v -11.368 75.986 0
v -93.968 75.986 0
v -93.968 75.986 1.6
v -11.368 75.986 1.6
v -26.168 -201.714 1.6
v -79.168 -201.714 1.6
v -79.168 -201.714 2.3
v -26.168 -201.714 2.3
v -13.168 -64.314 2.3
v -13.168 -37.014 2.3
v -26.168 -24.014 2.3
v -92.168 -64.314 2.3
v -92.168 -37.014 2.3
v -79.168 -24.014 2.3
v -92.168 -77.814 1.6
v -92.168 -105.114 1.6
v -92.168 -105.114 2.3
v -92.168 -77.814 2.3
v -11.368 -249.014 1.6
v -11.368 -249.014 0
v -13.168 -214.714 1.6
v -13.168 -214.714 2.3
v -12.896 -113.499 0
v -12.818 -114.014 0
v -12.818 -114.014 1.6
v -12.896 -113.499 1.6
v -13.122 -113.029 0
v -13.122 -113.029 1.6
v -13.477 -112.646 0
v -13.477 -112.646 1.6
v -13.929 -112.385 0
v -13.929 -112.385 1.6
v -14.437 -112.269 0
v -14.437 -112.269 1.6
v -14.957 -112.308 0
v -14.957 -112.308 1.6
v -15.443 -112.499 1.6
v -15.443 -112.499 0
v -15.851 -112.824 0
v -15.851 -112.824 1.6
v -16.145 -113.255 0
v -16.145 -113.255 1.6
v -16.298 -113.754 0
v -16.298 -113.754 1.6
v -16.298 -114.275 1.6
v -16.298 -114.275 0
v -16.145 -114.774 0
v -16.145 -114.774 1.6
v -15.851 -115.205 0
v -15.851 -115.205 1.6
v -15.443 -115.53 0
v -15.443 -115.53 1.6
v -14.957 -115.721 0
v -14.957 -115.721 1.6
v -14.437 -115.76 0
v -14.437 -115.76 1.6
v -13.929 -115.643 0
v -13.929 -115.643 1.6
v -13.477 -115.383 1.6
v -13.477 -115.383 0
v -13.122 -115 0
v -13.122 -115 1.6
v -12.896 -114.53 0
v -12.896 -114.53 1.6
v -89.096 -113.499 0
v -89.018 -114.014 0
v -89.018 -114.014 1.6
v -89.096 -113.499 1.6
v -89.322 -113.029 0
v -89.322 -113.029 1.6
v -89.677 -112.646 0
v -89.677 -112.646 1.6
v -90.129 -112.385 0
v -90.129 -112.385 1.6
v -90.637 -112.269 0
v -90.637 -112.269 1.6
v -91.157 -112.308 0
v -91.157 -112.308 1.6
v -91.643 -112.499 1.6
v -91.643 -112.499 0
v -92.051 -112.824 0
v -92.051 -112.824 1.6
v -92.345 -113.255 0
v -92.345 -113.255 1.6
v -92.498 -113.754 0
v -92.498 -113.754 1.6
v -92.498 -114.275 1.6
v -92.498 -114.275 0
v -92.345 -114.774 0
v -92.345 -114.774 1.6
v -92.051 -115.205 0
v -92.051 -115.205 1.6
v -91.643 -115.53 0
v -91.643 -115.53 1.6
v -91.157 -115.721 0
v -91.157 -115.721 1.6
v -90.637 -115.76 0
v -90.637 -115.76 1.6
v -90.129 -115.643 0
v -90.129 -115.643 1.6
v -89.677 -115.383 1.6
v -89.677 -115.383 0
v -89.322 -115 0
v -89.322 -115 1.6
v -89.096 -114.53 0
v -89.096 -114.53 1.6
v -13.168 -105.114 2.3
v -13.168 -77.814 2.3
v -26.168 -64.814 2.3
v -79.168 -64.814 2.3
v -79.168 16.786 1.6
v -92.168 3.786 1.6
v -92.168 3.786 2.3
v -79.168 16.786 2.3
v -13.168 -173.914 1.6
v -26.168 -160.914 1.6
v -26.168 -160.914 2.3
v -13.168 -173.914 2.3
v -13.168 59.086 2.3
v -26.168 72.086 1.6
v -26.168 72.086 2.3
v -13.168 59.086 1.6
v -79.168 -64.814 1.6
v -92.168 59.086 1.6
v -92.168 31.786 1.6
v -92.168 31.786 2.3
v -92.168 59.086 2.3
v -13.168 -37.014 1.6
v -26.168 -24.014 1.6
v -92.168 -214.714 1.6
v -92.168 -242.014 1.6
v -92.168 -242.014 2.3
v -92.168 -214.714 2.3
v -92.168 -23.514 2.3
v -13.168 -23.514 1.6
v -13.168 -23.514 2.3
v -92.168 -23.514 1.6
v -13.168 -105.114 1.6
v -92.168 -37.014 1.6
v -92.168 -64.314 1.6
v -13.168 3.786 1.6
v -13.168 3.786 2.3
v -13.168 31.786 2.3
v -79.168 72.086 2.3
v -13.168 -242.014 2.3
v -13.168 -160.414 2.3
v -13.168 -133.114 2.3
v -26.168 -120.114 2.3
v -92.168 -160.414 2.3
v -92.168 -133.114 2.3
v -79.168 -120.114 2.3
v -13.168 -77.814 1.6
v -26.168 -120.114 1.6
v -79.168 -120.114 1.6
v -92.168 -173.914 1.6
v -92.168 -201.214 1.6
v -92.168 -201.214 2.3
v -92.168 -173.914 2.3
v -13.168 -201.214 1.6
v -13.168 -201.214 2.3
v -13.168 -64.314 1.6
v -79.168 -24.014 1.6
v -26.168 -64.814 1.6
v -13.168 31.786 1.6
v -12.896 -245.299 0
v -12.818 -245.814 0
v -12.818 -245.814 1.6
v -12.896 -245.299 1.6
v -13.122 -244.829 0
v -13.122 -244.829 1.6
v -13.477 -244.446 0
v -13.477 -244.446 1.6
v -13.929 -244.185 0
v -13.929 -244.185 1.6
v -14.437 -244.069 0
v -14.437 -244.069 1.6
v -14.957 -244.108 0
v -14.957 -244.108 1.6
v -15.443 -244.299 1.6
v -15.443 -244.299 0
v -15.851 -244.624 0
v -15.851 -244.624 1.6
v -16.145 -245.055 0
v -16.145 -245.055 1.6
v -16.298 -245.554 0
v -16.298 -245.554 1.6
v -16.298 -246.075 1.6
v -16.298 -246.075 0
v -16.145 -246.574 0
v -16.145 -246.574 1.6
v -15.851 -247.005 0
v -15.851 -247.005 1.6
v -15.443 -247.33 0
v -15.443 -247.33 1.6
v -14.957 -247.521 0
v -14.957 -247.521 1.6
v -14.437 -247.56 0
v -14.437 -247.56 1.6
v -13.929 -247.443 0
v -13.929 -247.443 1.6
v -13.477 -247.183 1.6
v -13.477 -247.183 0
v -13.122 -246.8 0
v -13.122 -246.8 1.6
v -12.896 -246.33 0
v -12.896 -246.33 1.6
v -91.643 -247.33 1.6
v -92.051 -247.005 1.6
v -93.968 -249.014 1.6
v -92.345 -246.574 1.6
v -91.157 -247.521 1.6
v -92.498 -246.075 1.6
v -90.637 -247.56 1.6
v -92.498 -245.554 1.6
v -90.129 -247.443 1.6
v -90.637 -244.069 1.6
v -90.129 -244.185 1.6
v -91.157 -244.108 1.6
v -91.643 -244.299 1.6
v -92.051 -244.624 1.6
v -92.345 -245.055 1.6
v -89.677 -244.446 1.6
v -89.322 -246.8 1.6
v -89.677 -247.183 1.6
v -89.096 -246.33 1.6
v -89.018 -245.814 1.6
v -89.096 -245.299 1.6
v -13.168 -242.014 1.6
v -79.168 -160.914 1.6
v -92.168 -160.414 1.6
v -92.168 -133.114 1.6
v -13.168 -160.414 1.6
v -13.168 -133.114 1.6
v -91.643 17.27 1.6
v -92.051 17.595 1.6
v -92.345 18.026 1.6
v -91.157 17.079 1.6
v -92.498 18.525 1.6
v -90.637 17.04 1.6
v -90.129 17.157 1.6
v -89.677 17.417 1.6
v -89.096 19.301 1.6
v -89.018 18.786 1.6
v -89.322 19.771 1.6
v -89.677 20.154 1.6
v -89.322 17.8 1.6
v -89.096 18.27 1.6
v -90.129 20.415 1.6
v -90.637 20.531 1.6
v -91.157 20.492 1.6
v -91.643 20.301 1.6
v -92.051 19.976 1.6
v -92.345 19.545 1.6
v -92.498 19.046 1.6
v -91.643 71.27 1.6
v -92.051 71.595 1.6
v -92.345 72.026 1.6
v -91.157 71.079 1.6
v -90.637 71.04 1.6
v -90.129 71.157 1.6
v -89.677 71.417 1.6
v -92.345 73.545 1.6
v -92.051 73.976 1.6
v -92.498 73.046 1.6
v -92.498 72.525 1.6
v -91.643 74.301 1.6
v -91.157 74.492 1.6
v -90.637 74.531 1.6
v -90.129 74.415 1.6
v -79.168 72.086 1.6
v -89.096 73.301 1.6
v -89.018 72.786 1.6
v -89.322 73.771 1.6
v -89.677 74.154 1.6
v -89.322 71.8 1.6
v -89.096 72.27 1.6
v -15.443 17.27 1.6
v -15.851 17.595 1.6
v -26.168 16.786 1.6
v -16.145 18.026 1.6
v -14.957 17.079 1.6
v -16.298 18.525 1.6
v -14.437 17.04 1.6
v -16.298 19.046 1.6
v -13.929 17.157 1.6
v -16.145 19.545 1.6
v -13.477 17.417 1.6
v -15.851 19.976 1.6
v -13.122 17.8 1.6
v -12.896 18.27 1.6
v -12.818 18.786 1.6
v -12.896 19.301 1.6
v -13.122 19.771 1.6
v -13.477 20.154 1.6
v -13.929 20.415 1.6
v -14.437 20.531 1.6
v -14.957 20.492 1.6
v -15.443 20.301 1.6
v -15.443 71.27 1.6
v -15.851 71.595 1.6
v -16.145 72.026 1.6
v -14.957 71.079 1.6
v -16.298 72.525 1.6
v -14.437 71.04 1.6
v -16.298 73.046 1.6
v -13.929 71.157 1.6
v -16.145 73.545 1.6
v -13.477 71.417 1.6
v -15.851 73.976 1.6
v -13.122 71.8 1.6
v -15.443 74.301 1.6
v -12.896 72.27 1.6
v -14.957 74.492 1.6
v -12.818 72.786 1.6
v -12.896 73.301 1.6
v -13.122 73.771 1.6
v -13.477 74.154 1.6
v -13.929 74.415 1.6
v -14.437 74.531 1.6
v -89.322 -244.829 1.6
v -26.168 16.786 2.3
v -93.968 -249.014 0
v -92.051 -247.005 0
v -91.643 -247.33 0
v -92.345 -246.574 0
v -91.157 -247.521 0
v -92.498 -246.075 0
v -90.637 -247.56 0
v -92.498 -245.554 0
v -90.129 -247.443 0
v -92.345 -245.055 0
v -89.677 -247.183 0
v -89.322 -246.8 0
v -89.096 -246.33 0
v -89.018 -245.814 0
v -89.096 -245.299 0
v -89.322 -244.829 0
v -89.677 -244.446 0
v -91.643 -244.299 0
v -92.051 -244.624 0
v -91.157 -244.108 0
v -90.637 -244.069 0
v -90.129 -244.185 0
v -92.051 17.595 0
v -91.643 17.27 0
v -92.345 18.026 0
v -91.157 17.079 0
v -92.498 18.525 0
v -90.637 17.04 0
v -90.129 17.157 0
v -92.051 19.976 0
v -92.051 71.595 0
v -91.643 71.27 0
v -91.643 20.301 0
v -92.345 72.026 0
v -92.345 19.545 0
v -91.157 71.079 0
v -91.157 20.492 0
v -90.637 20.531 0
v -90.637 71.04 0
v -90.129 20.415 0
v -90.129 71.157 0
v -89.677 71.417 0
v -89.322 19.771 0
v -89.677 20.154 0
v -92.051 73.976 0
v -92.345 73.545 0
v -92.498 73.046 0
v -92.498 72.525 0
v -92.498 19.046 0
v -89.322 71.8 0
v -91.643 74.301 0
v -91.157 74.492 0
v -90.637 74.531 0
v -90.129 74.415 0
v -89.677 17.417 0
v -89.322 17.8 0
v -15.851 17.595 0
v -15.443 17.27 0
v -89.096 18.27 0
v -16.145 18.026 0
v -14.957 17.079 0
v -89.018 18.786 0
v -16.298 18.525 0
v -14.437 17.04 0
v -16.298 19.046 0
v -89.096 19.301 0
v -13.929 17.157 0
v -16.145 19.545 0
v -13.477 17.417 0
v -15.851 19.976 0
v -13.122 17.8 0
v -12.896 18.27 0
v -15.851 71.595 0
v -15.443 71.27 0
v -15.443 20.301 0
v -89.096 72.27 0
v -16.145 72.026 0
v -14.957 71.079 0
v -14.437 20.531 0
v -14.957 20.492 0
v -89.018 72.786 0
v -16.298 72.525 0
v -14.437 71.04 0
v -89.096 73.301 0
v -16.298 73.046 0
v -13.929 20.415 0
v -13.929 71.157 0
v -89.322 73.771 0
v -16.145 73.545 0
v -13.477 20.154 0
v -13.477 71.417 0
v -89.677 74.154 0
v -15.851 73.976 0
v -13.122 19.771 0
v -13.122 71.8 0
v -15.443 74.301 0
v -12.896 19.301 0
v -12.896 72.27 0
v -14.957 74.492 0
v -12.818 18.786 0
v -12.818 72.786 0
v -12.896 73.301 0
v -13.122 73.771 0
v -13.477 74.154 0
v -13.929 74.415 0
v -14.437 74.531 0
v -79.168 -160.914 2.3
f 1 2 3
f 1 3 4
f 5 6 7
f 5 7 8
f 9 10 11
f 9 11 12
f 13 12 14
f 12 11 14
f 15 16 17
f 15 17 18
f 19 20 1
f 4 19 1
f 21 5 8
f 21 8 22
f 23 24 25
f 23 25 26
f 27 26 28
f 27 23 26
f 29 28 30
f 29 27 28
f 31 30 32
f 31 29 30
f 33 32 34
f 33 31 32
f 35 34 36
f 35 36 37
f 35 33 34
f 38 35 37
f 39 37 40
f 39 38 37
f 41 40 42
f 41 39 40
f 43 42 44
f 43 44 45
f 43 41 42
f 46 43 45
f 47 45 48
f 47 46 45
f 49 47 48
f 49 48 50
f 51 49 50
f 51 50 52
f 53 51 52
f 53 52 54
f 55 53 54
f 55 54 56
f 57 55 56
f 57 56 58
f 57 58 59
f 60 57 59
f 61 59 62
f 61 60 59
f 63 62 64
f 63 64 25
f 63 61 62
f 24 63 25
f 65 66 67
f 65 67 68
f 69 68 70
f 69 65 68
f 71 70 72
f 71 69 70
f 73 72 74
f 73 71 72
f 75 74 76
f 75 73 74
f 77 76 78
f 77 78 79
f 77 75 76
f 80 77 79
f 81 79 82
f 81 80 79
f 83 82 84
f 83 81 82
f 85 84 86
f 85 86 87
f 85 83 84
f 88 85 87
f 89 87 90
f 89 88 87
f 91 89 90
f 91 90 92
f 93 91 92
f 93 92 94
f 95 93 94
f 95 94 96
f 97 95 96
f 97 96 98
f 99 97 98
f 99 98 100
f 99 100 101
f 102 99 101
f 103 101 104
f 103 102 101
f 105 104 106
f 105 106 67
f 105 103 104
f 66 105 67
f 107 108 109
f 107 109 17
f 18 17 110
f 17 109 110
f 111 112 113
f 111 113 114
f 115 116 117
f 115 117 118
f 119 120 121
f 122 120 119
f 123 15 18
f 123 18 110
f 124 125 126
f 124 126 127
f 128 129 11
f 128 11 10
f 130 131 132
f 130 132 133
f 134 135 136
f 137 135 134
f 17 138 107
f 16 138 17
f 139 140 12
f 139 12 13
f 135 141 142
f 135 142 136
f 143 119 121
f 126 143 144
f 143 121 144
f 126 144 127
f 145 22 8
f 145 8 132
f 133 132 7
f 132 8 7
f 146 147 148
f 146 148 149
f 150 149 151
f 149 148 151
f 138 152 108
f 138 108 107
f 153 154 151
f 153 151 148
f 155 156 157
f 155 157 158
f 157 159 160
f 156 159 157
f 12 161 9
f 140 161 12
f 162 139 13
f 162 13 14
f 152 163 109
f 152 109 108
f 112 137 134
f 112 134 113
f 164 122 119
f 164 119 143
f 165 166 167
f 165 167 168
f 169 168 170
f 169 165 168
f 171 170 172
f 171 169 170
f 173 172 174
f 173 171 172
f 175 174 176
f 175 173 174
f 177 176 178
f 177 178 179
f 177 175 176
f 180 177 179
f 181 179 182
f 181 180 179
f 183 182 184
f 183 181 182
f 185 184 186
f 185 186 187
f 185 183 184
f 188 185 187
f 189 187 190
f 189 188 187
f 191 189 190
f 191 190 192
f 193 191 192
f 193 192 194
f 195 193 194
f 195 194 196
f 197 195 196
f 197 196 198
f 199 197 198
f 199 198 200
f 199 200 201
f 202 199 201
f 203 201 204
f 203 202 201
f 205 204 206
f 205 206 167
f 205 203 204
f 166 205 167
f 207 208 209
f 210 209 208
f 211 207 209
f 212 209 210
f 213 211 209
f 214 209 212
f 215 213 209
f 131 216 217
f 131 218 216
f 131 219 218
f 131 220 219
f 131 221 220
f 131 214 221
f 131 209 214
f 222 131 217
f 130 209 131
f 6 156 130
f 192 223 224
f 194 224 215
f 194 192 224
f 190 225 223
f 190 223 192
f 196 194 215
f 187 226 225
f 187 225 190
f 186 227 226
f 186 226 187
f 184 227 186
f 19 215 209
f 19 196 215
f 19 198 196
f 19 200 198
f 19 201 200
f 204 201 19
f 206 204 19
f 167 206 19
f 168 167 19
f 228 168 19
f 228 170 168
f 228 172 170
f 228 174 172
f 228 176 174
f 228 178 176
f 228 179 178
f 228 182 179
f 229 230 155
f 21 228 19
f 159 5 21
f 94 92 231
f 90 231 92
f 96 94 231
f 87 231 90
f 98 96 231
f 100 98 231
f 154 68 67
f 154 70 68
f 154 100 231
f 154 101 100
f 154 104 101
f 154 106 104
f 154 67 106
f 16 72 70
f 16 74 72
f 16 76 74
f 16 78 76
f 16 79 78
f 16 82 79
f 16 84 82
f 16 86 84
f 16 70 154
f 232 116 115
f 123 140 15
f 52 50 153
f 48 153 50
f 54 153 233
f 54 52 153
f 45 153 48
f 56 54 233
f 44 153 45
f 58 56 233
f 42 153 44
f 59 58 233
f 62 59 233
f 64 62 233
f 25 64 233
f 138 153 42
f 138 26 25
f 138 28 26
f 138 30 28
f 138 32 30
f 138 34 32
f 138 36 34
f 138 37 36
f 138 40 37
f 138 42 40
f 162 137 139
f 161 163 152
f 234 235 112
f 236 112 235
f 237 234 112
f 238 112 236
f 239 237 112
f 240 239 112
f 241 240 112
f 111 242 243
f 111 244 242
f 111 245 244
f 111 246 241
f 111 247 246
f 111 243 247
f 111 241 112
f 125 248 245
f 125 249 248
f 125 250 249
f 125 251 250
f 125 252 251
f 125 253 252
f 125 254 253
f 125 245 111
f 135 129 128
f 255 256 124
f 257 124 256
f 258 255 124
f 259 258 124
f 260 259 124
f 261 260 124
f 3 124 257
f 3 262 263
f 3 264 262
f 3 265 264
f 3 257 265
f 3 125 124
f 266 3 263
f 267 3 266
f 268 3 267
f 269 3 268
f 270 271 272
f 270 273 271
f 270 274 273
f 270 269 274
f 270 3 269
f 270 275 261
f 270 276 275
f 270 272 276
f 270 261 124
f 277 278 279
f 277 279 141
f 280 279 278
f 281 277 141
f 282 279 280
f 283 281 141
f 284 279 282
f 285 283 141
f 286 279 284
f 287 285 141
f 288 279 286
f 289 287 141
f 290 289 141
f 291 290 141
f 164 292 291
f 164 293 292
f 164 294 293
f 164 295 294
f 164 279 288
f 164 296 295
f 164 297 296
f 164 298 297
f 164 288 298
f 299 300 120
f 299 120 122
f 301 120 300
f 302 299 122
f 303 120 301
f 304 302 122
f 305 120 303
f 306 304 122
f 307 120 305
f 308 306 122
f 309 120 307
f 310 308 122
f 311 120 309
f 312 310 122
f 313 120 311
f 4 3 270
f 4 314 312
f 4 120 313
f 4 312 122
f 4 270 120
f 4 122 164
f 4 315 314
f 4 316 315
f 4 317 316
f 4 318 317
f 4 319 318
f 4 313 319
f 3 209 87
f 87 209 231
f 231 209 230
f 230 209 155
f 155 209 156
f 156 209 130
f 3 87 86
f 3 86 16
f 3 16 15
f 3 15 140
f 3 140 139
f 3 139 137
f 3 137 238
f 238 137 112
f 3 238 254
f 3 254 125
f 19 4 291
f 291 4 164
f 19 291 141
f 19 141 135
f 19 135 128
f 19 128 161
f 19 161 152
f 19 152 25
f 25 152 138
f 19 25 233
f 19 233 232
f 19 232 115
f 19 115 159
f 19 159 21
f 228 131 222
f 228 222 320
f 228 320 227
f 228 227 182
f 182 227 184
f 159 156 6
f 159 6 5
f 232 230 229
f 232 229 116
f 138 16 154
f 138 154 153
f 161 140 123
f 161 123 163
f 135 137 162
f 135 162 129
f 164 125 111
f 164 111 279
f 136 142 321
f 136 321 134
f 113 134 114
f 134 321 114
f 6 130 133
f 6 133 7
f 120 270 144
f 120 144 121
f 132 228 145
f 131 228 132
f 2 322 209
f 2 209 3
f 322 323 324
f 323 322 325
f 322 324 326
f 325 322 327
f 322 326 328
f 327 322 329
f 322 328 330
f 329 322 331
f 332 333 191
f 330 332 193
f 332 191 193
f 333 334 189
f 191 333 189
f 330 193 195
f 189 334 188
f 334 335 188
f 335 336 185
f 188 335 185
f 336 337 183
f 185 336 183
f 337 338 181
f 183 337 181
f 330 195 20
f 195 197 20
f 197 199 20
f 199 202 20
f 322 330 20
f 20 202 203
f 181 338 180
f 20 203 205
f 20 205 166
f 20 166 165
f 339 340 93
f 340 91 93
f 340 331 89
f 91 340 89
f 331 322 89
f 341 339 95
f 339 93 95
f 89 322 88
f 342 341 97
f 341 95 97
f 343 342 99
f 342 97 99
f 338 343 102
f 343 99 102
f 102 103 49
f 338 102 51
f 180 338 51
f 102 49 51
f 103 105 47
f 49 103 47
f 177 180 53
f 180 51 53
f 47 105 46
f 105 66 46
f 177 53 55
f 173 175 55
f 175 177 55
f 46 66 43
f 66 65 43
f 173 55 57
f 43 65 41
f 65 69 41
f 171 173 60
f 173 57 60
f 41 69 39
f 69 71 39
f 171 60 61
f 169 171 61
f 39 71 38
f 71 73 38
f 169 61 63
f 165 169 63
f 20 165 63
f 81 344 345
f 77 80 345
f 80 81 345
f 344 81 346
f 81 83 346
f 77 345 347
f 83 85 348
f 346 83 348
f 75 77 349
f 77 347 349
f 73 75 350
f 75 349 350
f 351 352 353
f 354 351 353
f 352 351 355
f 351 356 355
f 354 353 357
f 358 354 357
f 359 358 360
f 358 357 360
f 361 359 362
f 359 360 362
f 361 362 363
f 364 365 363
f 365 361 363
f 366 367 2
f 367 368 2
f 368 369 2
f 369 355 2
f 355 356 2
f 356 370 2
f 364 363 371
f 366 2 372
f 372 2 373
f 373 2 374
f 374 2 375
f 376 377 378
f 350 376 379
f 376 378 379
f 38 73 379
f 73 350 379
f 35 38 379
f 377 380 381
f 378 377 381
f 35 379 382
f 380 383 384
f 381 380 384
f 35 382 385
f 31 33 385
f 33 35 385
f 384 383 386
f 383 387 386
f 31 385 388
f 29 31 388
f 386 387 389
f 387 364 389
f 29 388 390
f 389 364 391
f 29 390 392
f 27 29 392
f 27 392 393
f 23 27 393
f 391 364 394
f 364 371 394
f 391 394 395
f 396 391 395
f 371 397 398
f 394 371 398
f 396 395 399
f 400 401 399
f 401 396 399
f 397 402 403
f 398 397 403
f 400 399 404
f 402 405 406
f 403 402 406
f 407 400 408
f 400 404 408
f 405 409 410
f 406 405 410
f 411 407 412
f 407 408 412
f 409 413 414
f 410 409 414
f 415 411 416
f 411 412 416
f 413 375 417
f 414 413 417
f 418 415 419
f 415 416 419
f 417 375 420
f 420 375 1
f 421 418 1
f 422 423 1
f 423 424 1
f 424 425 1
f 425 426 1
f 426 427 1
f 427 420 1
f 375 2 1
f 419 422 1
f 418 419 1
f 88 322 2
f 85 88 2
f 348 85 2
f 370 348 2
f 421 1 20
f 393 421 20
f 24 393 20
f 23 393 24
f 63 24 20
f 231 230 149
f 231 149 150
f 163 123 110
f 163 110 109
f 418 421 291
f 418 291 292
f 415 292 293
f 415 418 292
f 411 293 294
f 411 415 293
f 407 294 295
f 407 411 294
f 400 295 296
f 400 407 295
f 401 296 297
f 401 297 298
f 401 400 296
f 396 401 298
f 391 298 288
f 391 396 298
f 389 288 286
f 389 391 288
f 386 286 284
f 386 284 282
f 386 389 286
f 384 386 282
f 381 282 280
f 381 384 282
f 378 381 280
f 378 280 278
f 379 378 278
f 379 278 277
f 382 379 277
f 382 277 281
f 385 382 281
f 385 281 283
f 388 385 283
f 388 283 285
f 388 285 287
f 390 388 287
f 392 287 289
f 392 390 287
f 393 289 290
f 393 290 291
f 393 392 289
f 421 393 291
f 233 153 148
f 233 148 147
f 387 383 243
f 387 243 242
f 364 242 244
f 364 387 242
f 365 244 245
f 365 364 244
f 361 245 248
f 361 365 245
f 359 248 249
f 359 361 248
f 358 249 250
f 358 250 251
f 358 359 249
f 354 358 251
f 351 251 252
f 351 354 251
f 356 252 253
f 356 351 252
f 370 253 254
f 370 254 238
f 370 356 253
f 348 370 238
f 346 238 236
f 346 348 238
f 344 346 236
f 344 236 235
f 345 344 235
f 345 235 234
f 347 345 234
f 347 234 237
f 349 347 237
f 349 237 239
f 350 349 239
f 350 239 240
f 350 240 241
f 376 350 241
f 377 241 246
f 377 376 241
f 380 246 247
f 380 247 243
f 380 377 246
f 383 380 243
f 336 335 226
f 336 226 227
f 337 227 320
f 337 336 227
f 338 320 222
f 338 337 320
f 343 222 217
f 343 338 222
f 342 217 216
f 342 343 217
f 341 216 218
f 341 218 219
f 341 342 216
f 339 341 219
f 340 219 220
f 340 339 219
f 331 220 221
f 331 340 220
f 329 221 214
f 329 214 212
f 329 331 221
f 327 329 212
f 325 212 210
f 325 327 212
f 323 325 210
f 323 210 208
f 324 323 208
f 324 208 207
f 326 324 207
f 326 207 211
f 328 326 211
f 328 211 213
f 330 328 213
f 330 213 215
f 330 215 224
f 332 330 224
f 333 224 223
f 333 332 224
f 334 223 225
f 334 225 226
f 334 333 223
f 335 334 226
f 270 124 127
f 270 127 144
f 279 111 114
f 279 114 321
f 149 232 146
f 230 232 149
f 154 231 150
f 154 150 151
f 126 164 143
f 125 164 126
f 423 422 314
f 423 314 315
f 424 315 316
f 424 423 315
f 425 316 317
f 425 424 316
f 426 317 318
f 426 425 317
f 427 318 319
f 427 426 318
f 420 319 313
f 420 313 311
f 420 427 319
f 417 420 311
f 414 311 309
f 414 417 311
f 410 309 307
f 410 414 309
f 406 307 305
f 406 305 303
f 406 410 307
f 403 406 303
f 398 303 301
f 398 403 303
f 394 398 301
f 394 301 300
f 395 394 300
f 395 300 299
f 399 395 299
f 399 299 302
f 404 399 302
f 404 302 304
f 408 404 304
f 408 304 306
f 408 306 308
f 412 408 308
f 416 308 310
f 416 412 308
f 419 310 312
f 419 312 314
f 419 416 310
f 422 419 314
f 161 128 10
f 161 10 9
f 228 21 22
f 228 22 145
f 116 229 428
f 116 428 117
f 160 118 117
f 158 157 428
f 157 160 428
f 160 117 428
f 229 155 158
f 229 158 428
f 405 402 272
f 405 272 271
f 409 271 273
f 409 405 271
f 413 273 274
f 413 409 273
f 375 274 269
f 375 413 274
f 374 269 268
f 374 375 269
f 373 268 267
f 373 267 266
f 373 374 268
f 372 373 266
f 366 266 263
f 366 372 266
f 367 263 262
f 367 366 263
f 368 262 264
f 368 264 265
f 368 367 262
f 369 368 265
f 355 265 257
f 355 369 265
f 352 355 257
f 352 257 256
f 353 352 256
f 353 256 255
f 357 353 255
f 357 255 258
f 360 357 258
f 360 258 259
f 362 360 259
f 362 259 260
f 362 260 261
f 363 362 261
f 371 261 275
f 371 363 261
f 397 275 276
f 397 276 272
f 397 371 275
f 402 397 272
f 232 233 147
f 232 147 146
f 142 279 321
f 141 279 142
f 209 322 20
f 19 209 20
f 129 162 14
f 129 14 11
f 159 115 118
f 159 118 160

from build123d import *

# Parameters (mm, degrees)
SKETCH1_W           = 82.6
SKETCH1_H           = 325
SKETCH1_R           = 1.75
BOSS_EXTRUDE4_DEPTH = 1.6
BOSS_EXTRUDE5_DEPTH = 2.3


with BuildPart() as part:
    # Sketch1 → Boss-Extrude4 (new body)
    with BuildSketch(Plane.XY):
        with Locations((-52.667971546, -86.514453125)):
            Rectangle(SKETCH1_W, SKETCH1_H)
        with Locations((-90.767971546, 72.785546875)):
            Circle(SKETCH1_R, mode=Mode.SUBTRACT)
        with Locations((-14.567971546, 72.785546875)):
            Circle(SKETCH1_R, mode=Mode.SUBTRACT)
        with Locations((-14.567971546, -245.814453125)):
            Circle(SKETCH1_R, mode=Mode.SUBTRACT)
        with Locations((-90.767971546, -245.814453125)):
            Circle(SKETCH1_R, mode=Mode.SUBTRACT)
        with Locations((-90.767971546, -114.014453125)):
            Circle(SKETCH1_R, mode=Mode.SUBTRACT)
        with Locations((-14.567971546, -114.014453125)):
            Circle(SKETCH1_R, mode=Mode.SUBTRACT)
        with Locations((-90.767971546, 18.785546875)):
            Circle(SKETCH1_R, mode=Mode.SUBTRACT)
        with Locations((-14.567971546, 18.785546875)):
            Circle(SKETCH1_R, mode=Mode.SUBTRACT)
        Polygon((-92.167971546, -214.714453125), (-79.167971546, -201.714453125), (-26.167971546, -201.714453125), (-13.167971546, -214.714453125), (-13.167971546, -242.014453125), (-92.167971546, -242.014453125), align=None, mode=Mode.SUBTRACT)
        Polygon((-92.167971546, -173.914453125), (-79.167971546, -160.914453125), (-26.167971546, -160.914453125), (-13.167971546, -173.914453125), (-13.167971546, -201.214453125), (-92.167971546, -201.214453125), align=None, mode=Mode.SUBTRACT)
        Polygon((-92.167971546, -37.014453125), (-79.167971546, -24.014453125), (-26.167971546, -24.014453125), (-13.167971546, -37.014453125), (-13.167971546, -64.314453125), (-92.167971546, -64.314453125), align=None, mode=Mode.SUBTRACT)
        Polygon((-92.167971546, -133.114453125), (-79.167971546, -120.114453125), (-26.167971546, -120.114453125), (-13.167971546, -133.114453125), (-13.167971546, -160.414453125), (-92.167971546, -160.414453125), align=None, mode=Mode.SUBTRACT)
        Polygon((-92.167971546, -77.814453125), (-79.167971546, -64.814453125), (-26.167971546, -64.814453125), (-13.167971546, -77.814453125), (-13.167971546, -105.114453125), (-92.167971546, -105.114453125), align=None, mode=Mode.SUBTRACT)
        Polygon((-92.167971546, 3.785546875), (-79.167971546, 16.785546875), (-26.167971546, 16.785546875), (-13.167971546, 3.785546875), (-13.167971546, -23.514453125), (-92.167971546, -23.514453125), align=None, mode=Mode.SUBTRACT)
        Polygon((-92.167971546, 59.085546875), (-79.167970879, 72.085546875), (-26.167970879, 72.085546875), (-13.167971546, 59.085546875), (-13.167971546, 31.785546875), (-92.167971546, 31.785546875), align=None, mode=Mode.SUBTRACT)
    extrude(amount=BOSS_EXTRUDE4_DEPTH)

    # Sketch1<8> → Boss-Extrude5 (add)
    with BuildSketch(Plane.XY):
        Polygon((-79.167971546, -201.714453125), (-92.167971546, -214.714453125), (-92.167971546, -242.014453125), (-13.167971546, -242.014453125), (-13.167971546, -214.714453125), (-26.167971546, -201.714453125), align=None)
        Polygon((-79.167971546, -160.914453125), (-92.167971546, -173.914453125), (-92.167971546, -201.214453125), (-13.167971546, -201.214453125), (-13.167971546, -173.914453125), (-26.167971546, -160.914453125), align=None)
        Polygon((-79.167971546, -24.014453125), (-92.167971546, -37.014453125), (-92.167971546, -64.314453125), (-13.167971546, -64.314453125), (-13.167971546, -37.014453125), (-26.167971546, -24.014453125), align=None)
        Polygon((-79.167971546, -120.114453125), (-92.167971546, -133.114453125), (-92.167971546, -160.414453125), (-13.167971546, -160.414453125), (-13.167971546, -133.114453125), (-26.167971546, -120.114453125), align=None)
        Polygon((-79.167971546, -64.814453125), (-92.167971546, -77.814453125), (-92.167971546, -105.114453125), (-13.167971546, -105.114453125), (-13.167971546, -77.814453125), (-26.167971546, -64.814453125), align=None)
        Polygon((-79.167971546, 16.785546875), (-92.167971546, 3.785546875), (-92.167971546, -23.514453125), (-13.167971546, -23.514453125), (-13.167971546, 3.785546875), (-26.167971546, 16.785546875), align=None)
        Polygon((-79.167970879, 72.085546875), (-92.167971546, 59.085546875), (-92.167971546, 31.785546875), (-13.167971546, 31.785546875), (-13.167971546, 59.085546875), (-26.167970879, 72.085546875), align=None)
    extrude(amount=BOSS_EXTRUDE5_DEPTH)


solid = part.part
